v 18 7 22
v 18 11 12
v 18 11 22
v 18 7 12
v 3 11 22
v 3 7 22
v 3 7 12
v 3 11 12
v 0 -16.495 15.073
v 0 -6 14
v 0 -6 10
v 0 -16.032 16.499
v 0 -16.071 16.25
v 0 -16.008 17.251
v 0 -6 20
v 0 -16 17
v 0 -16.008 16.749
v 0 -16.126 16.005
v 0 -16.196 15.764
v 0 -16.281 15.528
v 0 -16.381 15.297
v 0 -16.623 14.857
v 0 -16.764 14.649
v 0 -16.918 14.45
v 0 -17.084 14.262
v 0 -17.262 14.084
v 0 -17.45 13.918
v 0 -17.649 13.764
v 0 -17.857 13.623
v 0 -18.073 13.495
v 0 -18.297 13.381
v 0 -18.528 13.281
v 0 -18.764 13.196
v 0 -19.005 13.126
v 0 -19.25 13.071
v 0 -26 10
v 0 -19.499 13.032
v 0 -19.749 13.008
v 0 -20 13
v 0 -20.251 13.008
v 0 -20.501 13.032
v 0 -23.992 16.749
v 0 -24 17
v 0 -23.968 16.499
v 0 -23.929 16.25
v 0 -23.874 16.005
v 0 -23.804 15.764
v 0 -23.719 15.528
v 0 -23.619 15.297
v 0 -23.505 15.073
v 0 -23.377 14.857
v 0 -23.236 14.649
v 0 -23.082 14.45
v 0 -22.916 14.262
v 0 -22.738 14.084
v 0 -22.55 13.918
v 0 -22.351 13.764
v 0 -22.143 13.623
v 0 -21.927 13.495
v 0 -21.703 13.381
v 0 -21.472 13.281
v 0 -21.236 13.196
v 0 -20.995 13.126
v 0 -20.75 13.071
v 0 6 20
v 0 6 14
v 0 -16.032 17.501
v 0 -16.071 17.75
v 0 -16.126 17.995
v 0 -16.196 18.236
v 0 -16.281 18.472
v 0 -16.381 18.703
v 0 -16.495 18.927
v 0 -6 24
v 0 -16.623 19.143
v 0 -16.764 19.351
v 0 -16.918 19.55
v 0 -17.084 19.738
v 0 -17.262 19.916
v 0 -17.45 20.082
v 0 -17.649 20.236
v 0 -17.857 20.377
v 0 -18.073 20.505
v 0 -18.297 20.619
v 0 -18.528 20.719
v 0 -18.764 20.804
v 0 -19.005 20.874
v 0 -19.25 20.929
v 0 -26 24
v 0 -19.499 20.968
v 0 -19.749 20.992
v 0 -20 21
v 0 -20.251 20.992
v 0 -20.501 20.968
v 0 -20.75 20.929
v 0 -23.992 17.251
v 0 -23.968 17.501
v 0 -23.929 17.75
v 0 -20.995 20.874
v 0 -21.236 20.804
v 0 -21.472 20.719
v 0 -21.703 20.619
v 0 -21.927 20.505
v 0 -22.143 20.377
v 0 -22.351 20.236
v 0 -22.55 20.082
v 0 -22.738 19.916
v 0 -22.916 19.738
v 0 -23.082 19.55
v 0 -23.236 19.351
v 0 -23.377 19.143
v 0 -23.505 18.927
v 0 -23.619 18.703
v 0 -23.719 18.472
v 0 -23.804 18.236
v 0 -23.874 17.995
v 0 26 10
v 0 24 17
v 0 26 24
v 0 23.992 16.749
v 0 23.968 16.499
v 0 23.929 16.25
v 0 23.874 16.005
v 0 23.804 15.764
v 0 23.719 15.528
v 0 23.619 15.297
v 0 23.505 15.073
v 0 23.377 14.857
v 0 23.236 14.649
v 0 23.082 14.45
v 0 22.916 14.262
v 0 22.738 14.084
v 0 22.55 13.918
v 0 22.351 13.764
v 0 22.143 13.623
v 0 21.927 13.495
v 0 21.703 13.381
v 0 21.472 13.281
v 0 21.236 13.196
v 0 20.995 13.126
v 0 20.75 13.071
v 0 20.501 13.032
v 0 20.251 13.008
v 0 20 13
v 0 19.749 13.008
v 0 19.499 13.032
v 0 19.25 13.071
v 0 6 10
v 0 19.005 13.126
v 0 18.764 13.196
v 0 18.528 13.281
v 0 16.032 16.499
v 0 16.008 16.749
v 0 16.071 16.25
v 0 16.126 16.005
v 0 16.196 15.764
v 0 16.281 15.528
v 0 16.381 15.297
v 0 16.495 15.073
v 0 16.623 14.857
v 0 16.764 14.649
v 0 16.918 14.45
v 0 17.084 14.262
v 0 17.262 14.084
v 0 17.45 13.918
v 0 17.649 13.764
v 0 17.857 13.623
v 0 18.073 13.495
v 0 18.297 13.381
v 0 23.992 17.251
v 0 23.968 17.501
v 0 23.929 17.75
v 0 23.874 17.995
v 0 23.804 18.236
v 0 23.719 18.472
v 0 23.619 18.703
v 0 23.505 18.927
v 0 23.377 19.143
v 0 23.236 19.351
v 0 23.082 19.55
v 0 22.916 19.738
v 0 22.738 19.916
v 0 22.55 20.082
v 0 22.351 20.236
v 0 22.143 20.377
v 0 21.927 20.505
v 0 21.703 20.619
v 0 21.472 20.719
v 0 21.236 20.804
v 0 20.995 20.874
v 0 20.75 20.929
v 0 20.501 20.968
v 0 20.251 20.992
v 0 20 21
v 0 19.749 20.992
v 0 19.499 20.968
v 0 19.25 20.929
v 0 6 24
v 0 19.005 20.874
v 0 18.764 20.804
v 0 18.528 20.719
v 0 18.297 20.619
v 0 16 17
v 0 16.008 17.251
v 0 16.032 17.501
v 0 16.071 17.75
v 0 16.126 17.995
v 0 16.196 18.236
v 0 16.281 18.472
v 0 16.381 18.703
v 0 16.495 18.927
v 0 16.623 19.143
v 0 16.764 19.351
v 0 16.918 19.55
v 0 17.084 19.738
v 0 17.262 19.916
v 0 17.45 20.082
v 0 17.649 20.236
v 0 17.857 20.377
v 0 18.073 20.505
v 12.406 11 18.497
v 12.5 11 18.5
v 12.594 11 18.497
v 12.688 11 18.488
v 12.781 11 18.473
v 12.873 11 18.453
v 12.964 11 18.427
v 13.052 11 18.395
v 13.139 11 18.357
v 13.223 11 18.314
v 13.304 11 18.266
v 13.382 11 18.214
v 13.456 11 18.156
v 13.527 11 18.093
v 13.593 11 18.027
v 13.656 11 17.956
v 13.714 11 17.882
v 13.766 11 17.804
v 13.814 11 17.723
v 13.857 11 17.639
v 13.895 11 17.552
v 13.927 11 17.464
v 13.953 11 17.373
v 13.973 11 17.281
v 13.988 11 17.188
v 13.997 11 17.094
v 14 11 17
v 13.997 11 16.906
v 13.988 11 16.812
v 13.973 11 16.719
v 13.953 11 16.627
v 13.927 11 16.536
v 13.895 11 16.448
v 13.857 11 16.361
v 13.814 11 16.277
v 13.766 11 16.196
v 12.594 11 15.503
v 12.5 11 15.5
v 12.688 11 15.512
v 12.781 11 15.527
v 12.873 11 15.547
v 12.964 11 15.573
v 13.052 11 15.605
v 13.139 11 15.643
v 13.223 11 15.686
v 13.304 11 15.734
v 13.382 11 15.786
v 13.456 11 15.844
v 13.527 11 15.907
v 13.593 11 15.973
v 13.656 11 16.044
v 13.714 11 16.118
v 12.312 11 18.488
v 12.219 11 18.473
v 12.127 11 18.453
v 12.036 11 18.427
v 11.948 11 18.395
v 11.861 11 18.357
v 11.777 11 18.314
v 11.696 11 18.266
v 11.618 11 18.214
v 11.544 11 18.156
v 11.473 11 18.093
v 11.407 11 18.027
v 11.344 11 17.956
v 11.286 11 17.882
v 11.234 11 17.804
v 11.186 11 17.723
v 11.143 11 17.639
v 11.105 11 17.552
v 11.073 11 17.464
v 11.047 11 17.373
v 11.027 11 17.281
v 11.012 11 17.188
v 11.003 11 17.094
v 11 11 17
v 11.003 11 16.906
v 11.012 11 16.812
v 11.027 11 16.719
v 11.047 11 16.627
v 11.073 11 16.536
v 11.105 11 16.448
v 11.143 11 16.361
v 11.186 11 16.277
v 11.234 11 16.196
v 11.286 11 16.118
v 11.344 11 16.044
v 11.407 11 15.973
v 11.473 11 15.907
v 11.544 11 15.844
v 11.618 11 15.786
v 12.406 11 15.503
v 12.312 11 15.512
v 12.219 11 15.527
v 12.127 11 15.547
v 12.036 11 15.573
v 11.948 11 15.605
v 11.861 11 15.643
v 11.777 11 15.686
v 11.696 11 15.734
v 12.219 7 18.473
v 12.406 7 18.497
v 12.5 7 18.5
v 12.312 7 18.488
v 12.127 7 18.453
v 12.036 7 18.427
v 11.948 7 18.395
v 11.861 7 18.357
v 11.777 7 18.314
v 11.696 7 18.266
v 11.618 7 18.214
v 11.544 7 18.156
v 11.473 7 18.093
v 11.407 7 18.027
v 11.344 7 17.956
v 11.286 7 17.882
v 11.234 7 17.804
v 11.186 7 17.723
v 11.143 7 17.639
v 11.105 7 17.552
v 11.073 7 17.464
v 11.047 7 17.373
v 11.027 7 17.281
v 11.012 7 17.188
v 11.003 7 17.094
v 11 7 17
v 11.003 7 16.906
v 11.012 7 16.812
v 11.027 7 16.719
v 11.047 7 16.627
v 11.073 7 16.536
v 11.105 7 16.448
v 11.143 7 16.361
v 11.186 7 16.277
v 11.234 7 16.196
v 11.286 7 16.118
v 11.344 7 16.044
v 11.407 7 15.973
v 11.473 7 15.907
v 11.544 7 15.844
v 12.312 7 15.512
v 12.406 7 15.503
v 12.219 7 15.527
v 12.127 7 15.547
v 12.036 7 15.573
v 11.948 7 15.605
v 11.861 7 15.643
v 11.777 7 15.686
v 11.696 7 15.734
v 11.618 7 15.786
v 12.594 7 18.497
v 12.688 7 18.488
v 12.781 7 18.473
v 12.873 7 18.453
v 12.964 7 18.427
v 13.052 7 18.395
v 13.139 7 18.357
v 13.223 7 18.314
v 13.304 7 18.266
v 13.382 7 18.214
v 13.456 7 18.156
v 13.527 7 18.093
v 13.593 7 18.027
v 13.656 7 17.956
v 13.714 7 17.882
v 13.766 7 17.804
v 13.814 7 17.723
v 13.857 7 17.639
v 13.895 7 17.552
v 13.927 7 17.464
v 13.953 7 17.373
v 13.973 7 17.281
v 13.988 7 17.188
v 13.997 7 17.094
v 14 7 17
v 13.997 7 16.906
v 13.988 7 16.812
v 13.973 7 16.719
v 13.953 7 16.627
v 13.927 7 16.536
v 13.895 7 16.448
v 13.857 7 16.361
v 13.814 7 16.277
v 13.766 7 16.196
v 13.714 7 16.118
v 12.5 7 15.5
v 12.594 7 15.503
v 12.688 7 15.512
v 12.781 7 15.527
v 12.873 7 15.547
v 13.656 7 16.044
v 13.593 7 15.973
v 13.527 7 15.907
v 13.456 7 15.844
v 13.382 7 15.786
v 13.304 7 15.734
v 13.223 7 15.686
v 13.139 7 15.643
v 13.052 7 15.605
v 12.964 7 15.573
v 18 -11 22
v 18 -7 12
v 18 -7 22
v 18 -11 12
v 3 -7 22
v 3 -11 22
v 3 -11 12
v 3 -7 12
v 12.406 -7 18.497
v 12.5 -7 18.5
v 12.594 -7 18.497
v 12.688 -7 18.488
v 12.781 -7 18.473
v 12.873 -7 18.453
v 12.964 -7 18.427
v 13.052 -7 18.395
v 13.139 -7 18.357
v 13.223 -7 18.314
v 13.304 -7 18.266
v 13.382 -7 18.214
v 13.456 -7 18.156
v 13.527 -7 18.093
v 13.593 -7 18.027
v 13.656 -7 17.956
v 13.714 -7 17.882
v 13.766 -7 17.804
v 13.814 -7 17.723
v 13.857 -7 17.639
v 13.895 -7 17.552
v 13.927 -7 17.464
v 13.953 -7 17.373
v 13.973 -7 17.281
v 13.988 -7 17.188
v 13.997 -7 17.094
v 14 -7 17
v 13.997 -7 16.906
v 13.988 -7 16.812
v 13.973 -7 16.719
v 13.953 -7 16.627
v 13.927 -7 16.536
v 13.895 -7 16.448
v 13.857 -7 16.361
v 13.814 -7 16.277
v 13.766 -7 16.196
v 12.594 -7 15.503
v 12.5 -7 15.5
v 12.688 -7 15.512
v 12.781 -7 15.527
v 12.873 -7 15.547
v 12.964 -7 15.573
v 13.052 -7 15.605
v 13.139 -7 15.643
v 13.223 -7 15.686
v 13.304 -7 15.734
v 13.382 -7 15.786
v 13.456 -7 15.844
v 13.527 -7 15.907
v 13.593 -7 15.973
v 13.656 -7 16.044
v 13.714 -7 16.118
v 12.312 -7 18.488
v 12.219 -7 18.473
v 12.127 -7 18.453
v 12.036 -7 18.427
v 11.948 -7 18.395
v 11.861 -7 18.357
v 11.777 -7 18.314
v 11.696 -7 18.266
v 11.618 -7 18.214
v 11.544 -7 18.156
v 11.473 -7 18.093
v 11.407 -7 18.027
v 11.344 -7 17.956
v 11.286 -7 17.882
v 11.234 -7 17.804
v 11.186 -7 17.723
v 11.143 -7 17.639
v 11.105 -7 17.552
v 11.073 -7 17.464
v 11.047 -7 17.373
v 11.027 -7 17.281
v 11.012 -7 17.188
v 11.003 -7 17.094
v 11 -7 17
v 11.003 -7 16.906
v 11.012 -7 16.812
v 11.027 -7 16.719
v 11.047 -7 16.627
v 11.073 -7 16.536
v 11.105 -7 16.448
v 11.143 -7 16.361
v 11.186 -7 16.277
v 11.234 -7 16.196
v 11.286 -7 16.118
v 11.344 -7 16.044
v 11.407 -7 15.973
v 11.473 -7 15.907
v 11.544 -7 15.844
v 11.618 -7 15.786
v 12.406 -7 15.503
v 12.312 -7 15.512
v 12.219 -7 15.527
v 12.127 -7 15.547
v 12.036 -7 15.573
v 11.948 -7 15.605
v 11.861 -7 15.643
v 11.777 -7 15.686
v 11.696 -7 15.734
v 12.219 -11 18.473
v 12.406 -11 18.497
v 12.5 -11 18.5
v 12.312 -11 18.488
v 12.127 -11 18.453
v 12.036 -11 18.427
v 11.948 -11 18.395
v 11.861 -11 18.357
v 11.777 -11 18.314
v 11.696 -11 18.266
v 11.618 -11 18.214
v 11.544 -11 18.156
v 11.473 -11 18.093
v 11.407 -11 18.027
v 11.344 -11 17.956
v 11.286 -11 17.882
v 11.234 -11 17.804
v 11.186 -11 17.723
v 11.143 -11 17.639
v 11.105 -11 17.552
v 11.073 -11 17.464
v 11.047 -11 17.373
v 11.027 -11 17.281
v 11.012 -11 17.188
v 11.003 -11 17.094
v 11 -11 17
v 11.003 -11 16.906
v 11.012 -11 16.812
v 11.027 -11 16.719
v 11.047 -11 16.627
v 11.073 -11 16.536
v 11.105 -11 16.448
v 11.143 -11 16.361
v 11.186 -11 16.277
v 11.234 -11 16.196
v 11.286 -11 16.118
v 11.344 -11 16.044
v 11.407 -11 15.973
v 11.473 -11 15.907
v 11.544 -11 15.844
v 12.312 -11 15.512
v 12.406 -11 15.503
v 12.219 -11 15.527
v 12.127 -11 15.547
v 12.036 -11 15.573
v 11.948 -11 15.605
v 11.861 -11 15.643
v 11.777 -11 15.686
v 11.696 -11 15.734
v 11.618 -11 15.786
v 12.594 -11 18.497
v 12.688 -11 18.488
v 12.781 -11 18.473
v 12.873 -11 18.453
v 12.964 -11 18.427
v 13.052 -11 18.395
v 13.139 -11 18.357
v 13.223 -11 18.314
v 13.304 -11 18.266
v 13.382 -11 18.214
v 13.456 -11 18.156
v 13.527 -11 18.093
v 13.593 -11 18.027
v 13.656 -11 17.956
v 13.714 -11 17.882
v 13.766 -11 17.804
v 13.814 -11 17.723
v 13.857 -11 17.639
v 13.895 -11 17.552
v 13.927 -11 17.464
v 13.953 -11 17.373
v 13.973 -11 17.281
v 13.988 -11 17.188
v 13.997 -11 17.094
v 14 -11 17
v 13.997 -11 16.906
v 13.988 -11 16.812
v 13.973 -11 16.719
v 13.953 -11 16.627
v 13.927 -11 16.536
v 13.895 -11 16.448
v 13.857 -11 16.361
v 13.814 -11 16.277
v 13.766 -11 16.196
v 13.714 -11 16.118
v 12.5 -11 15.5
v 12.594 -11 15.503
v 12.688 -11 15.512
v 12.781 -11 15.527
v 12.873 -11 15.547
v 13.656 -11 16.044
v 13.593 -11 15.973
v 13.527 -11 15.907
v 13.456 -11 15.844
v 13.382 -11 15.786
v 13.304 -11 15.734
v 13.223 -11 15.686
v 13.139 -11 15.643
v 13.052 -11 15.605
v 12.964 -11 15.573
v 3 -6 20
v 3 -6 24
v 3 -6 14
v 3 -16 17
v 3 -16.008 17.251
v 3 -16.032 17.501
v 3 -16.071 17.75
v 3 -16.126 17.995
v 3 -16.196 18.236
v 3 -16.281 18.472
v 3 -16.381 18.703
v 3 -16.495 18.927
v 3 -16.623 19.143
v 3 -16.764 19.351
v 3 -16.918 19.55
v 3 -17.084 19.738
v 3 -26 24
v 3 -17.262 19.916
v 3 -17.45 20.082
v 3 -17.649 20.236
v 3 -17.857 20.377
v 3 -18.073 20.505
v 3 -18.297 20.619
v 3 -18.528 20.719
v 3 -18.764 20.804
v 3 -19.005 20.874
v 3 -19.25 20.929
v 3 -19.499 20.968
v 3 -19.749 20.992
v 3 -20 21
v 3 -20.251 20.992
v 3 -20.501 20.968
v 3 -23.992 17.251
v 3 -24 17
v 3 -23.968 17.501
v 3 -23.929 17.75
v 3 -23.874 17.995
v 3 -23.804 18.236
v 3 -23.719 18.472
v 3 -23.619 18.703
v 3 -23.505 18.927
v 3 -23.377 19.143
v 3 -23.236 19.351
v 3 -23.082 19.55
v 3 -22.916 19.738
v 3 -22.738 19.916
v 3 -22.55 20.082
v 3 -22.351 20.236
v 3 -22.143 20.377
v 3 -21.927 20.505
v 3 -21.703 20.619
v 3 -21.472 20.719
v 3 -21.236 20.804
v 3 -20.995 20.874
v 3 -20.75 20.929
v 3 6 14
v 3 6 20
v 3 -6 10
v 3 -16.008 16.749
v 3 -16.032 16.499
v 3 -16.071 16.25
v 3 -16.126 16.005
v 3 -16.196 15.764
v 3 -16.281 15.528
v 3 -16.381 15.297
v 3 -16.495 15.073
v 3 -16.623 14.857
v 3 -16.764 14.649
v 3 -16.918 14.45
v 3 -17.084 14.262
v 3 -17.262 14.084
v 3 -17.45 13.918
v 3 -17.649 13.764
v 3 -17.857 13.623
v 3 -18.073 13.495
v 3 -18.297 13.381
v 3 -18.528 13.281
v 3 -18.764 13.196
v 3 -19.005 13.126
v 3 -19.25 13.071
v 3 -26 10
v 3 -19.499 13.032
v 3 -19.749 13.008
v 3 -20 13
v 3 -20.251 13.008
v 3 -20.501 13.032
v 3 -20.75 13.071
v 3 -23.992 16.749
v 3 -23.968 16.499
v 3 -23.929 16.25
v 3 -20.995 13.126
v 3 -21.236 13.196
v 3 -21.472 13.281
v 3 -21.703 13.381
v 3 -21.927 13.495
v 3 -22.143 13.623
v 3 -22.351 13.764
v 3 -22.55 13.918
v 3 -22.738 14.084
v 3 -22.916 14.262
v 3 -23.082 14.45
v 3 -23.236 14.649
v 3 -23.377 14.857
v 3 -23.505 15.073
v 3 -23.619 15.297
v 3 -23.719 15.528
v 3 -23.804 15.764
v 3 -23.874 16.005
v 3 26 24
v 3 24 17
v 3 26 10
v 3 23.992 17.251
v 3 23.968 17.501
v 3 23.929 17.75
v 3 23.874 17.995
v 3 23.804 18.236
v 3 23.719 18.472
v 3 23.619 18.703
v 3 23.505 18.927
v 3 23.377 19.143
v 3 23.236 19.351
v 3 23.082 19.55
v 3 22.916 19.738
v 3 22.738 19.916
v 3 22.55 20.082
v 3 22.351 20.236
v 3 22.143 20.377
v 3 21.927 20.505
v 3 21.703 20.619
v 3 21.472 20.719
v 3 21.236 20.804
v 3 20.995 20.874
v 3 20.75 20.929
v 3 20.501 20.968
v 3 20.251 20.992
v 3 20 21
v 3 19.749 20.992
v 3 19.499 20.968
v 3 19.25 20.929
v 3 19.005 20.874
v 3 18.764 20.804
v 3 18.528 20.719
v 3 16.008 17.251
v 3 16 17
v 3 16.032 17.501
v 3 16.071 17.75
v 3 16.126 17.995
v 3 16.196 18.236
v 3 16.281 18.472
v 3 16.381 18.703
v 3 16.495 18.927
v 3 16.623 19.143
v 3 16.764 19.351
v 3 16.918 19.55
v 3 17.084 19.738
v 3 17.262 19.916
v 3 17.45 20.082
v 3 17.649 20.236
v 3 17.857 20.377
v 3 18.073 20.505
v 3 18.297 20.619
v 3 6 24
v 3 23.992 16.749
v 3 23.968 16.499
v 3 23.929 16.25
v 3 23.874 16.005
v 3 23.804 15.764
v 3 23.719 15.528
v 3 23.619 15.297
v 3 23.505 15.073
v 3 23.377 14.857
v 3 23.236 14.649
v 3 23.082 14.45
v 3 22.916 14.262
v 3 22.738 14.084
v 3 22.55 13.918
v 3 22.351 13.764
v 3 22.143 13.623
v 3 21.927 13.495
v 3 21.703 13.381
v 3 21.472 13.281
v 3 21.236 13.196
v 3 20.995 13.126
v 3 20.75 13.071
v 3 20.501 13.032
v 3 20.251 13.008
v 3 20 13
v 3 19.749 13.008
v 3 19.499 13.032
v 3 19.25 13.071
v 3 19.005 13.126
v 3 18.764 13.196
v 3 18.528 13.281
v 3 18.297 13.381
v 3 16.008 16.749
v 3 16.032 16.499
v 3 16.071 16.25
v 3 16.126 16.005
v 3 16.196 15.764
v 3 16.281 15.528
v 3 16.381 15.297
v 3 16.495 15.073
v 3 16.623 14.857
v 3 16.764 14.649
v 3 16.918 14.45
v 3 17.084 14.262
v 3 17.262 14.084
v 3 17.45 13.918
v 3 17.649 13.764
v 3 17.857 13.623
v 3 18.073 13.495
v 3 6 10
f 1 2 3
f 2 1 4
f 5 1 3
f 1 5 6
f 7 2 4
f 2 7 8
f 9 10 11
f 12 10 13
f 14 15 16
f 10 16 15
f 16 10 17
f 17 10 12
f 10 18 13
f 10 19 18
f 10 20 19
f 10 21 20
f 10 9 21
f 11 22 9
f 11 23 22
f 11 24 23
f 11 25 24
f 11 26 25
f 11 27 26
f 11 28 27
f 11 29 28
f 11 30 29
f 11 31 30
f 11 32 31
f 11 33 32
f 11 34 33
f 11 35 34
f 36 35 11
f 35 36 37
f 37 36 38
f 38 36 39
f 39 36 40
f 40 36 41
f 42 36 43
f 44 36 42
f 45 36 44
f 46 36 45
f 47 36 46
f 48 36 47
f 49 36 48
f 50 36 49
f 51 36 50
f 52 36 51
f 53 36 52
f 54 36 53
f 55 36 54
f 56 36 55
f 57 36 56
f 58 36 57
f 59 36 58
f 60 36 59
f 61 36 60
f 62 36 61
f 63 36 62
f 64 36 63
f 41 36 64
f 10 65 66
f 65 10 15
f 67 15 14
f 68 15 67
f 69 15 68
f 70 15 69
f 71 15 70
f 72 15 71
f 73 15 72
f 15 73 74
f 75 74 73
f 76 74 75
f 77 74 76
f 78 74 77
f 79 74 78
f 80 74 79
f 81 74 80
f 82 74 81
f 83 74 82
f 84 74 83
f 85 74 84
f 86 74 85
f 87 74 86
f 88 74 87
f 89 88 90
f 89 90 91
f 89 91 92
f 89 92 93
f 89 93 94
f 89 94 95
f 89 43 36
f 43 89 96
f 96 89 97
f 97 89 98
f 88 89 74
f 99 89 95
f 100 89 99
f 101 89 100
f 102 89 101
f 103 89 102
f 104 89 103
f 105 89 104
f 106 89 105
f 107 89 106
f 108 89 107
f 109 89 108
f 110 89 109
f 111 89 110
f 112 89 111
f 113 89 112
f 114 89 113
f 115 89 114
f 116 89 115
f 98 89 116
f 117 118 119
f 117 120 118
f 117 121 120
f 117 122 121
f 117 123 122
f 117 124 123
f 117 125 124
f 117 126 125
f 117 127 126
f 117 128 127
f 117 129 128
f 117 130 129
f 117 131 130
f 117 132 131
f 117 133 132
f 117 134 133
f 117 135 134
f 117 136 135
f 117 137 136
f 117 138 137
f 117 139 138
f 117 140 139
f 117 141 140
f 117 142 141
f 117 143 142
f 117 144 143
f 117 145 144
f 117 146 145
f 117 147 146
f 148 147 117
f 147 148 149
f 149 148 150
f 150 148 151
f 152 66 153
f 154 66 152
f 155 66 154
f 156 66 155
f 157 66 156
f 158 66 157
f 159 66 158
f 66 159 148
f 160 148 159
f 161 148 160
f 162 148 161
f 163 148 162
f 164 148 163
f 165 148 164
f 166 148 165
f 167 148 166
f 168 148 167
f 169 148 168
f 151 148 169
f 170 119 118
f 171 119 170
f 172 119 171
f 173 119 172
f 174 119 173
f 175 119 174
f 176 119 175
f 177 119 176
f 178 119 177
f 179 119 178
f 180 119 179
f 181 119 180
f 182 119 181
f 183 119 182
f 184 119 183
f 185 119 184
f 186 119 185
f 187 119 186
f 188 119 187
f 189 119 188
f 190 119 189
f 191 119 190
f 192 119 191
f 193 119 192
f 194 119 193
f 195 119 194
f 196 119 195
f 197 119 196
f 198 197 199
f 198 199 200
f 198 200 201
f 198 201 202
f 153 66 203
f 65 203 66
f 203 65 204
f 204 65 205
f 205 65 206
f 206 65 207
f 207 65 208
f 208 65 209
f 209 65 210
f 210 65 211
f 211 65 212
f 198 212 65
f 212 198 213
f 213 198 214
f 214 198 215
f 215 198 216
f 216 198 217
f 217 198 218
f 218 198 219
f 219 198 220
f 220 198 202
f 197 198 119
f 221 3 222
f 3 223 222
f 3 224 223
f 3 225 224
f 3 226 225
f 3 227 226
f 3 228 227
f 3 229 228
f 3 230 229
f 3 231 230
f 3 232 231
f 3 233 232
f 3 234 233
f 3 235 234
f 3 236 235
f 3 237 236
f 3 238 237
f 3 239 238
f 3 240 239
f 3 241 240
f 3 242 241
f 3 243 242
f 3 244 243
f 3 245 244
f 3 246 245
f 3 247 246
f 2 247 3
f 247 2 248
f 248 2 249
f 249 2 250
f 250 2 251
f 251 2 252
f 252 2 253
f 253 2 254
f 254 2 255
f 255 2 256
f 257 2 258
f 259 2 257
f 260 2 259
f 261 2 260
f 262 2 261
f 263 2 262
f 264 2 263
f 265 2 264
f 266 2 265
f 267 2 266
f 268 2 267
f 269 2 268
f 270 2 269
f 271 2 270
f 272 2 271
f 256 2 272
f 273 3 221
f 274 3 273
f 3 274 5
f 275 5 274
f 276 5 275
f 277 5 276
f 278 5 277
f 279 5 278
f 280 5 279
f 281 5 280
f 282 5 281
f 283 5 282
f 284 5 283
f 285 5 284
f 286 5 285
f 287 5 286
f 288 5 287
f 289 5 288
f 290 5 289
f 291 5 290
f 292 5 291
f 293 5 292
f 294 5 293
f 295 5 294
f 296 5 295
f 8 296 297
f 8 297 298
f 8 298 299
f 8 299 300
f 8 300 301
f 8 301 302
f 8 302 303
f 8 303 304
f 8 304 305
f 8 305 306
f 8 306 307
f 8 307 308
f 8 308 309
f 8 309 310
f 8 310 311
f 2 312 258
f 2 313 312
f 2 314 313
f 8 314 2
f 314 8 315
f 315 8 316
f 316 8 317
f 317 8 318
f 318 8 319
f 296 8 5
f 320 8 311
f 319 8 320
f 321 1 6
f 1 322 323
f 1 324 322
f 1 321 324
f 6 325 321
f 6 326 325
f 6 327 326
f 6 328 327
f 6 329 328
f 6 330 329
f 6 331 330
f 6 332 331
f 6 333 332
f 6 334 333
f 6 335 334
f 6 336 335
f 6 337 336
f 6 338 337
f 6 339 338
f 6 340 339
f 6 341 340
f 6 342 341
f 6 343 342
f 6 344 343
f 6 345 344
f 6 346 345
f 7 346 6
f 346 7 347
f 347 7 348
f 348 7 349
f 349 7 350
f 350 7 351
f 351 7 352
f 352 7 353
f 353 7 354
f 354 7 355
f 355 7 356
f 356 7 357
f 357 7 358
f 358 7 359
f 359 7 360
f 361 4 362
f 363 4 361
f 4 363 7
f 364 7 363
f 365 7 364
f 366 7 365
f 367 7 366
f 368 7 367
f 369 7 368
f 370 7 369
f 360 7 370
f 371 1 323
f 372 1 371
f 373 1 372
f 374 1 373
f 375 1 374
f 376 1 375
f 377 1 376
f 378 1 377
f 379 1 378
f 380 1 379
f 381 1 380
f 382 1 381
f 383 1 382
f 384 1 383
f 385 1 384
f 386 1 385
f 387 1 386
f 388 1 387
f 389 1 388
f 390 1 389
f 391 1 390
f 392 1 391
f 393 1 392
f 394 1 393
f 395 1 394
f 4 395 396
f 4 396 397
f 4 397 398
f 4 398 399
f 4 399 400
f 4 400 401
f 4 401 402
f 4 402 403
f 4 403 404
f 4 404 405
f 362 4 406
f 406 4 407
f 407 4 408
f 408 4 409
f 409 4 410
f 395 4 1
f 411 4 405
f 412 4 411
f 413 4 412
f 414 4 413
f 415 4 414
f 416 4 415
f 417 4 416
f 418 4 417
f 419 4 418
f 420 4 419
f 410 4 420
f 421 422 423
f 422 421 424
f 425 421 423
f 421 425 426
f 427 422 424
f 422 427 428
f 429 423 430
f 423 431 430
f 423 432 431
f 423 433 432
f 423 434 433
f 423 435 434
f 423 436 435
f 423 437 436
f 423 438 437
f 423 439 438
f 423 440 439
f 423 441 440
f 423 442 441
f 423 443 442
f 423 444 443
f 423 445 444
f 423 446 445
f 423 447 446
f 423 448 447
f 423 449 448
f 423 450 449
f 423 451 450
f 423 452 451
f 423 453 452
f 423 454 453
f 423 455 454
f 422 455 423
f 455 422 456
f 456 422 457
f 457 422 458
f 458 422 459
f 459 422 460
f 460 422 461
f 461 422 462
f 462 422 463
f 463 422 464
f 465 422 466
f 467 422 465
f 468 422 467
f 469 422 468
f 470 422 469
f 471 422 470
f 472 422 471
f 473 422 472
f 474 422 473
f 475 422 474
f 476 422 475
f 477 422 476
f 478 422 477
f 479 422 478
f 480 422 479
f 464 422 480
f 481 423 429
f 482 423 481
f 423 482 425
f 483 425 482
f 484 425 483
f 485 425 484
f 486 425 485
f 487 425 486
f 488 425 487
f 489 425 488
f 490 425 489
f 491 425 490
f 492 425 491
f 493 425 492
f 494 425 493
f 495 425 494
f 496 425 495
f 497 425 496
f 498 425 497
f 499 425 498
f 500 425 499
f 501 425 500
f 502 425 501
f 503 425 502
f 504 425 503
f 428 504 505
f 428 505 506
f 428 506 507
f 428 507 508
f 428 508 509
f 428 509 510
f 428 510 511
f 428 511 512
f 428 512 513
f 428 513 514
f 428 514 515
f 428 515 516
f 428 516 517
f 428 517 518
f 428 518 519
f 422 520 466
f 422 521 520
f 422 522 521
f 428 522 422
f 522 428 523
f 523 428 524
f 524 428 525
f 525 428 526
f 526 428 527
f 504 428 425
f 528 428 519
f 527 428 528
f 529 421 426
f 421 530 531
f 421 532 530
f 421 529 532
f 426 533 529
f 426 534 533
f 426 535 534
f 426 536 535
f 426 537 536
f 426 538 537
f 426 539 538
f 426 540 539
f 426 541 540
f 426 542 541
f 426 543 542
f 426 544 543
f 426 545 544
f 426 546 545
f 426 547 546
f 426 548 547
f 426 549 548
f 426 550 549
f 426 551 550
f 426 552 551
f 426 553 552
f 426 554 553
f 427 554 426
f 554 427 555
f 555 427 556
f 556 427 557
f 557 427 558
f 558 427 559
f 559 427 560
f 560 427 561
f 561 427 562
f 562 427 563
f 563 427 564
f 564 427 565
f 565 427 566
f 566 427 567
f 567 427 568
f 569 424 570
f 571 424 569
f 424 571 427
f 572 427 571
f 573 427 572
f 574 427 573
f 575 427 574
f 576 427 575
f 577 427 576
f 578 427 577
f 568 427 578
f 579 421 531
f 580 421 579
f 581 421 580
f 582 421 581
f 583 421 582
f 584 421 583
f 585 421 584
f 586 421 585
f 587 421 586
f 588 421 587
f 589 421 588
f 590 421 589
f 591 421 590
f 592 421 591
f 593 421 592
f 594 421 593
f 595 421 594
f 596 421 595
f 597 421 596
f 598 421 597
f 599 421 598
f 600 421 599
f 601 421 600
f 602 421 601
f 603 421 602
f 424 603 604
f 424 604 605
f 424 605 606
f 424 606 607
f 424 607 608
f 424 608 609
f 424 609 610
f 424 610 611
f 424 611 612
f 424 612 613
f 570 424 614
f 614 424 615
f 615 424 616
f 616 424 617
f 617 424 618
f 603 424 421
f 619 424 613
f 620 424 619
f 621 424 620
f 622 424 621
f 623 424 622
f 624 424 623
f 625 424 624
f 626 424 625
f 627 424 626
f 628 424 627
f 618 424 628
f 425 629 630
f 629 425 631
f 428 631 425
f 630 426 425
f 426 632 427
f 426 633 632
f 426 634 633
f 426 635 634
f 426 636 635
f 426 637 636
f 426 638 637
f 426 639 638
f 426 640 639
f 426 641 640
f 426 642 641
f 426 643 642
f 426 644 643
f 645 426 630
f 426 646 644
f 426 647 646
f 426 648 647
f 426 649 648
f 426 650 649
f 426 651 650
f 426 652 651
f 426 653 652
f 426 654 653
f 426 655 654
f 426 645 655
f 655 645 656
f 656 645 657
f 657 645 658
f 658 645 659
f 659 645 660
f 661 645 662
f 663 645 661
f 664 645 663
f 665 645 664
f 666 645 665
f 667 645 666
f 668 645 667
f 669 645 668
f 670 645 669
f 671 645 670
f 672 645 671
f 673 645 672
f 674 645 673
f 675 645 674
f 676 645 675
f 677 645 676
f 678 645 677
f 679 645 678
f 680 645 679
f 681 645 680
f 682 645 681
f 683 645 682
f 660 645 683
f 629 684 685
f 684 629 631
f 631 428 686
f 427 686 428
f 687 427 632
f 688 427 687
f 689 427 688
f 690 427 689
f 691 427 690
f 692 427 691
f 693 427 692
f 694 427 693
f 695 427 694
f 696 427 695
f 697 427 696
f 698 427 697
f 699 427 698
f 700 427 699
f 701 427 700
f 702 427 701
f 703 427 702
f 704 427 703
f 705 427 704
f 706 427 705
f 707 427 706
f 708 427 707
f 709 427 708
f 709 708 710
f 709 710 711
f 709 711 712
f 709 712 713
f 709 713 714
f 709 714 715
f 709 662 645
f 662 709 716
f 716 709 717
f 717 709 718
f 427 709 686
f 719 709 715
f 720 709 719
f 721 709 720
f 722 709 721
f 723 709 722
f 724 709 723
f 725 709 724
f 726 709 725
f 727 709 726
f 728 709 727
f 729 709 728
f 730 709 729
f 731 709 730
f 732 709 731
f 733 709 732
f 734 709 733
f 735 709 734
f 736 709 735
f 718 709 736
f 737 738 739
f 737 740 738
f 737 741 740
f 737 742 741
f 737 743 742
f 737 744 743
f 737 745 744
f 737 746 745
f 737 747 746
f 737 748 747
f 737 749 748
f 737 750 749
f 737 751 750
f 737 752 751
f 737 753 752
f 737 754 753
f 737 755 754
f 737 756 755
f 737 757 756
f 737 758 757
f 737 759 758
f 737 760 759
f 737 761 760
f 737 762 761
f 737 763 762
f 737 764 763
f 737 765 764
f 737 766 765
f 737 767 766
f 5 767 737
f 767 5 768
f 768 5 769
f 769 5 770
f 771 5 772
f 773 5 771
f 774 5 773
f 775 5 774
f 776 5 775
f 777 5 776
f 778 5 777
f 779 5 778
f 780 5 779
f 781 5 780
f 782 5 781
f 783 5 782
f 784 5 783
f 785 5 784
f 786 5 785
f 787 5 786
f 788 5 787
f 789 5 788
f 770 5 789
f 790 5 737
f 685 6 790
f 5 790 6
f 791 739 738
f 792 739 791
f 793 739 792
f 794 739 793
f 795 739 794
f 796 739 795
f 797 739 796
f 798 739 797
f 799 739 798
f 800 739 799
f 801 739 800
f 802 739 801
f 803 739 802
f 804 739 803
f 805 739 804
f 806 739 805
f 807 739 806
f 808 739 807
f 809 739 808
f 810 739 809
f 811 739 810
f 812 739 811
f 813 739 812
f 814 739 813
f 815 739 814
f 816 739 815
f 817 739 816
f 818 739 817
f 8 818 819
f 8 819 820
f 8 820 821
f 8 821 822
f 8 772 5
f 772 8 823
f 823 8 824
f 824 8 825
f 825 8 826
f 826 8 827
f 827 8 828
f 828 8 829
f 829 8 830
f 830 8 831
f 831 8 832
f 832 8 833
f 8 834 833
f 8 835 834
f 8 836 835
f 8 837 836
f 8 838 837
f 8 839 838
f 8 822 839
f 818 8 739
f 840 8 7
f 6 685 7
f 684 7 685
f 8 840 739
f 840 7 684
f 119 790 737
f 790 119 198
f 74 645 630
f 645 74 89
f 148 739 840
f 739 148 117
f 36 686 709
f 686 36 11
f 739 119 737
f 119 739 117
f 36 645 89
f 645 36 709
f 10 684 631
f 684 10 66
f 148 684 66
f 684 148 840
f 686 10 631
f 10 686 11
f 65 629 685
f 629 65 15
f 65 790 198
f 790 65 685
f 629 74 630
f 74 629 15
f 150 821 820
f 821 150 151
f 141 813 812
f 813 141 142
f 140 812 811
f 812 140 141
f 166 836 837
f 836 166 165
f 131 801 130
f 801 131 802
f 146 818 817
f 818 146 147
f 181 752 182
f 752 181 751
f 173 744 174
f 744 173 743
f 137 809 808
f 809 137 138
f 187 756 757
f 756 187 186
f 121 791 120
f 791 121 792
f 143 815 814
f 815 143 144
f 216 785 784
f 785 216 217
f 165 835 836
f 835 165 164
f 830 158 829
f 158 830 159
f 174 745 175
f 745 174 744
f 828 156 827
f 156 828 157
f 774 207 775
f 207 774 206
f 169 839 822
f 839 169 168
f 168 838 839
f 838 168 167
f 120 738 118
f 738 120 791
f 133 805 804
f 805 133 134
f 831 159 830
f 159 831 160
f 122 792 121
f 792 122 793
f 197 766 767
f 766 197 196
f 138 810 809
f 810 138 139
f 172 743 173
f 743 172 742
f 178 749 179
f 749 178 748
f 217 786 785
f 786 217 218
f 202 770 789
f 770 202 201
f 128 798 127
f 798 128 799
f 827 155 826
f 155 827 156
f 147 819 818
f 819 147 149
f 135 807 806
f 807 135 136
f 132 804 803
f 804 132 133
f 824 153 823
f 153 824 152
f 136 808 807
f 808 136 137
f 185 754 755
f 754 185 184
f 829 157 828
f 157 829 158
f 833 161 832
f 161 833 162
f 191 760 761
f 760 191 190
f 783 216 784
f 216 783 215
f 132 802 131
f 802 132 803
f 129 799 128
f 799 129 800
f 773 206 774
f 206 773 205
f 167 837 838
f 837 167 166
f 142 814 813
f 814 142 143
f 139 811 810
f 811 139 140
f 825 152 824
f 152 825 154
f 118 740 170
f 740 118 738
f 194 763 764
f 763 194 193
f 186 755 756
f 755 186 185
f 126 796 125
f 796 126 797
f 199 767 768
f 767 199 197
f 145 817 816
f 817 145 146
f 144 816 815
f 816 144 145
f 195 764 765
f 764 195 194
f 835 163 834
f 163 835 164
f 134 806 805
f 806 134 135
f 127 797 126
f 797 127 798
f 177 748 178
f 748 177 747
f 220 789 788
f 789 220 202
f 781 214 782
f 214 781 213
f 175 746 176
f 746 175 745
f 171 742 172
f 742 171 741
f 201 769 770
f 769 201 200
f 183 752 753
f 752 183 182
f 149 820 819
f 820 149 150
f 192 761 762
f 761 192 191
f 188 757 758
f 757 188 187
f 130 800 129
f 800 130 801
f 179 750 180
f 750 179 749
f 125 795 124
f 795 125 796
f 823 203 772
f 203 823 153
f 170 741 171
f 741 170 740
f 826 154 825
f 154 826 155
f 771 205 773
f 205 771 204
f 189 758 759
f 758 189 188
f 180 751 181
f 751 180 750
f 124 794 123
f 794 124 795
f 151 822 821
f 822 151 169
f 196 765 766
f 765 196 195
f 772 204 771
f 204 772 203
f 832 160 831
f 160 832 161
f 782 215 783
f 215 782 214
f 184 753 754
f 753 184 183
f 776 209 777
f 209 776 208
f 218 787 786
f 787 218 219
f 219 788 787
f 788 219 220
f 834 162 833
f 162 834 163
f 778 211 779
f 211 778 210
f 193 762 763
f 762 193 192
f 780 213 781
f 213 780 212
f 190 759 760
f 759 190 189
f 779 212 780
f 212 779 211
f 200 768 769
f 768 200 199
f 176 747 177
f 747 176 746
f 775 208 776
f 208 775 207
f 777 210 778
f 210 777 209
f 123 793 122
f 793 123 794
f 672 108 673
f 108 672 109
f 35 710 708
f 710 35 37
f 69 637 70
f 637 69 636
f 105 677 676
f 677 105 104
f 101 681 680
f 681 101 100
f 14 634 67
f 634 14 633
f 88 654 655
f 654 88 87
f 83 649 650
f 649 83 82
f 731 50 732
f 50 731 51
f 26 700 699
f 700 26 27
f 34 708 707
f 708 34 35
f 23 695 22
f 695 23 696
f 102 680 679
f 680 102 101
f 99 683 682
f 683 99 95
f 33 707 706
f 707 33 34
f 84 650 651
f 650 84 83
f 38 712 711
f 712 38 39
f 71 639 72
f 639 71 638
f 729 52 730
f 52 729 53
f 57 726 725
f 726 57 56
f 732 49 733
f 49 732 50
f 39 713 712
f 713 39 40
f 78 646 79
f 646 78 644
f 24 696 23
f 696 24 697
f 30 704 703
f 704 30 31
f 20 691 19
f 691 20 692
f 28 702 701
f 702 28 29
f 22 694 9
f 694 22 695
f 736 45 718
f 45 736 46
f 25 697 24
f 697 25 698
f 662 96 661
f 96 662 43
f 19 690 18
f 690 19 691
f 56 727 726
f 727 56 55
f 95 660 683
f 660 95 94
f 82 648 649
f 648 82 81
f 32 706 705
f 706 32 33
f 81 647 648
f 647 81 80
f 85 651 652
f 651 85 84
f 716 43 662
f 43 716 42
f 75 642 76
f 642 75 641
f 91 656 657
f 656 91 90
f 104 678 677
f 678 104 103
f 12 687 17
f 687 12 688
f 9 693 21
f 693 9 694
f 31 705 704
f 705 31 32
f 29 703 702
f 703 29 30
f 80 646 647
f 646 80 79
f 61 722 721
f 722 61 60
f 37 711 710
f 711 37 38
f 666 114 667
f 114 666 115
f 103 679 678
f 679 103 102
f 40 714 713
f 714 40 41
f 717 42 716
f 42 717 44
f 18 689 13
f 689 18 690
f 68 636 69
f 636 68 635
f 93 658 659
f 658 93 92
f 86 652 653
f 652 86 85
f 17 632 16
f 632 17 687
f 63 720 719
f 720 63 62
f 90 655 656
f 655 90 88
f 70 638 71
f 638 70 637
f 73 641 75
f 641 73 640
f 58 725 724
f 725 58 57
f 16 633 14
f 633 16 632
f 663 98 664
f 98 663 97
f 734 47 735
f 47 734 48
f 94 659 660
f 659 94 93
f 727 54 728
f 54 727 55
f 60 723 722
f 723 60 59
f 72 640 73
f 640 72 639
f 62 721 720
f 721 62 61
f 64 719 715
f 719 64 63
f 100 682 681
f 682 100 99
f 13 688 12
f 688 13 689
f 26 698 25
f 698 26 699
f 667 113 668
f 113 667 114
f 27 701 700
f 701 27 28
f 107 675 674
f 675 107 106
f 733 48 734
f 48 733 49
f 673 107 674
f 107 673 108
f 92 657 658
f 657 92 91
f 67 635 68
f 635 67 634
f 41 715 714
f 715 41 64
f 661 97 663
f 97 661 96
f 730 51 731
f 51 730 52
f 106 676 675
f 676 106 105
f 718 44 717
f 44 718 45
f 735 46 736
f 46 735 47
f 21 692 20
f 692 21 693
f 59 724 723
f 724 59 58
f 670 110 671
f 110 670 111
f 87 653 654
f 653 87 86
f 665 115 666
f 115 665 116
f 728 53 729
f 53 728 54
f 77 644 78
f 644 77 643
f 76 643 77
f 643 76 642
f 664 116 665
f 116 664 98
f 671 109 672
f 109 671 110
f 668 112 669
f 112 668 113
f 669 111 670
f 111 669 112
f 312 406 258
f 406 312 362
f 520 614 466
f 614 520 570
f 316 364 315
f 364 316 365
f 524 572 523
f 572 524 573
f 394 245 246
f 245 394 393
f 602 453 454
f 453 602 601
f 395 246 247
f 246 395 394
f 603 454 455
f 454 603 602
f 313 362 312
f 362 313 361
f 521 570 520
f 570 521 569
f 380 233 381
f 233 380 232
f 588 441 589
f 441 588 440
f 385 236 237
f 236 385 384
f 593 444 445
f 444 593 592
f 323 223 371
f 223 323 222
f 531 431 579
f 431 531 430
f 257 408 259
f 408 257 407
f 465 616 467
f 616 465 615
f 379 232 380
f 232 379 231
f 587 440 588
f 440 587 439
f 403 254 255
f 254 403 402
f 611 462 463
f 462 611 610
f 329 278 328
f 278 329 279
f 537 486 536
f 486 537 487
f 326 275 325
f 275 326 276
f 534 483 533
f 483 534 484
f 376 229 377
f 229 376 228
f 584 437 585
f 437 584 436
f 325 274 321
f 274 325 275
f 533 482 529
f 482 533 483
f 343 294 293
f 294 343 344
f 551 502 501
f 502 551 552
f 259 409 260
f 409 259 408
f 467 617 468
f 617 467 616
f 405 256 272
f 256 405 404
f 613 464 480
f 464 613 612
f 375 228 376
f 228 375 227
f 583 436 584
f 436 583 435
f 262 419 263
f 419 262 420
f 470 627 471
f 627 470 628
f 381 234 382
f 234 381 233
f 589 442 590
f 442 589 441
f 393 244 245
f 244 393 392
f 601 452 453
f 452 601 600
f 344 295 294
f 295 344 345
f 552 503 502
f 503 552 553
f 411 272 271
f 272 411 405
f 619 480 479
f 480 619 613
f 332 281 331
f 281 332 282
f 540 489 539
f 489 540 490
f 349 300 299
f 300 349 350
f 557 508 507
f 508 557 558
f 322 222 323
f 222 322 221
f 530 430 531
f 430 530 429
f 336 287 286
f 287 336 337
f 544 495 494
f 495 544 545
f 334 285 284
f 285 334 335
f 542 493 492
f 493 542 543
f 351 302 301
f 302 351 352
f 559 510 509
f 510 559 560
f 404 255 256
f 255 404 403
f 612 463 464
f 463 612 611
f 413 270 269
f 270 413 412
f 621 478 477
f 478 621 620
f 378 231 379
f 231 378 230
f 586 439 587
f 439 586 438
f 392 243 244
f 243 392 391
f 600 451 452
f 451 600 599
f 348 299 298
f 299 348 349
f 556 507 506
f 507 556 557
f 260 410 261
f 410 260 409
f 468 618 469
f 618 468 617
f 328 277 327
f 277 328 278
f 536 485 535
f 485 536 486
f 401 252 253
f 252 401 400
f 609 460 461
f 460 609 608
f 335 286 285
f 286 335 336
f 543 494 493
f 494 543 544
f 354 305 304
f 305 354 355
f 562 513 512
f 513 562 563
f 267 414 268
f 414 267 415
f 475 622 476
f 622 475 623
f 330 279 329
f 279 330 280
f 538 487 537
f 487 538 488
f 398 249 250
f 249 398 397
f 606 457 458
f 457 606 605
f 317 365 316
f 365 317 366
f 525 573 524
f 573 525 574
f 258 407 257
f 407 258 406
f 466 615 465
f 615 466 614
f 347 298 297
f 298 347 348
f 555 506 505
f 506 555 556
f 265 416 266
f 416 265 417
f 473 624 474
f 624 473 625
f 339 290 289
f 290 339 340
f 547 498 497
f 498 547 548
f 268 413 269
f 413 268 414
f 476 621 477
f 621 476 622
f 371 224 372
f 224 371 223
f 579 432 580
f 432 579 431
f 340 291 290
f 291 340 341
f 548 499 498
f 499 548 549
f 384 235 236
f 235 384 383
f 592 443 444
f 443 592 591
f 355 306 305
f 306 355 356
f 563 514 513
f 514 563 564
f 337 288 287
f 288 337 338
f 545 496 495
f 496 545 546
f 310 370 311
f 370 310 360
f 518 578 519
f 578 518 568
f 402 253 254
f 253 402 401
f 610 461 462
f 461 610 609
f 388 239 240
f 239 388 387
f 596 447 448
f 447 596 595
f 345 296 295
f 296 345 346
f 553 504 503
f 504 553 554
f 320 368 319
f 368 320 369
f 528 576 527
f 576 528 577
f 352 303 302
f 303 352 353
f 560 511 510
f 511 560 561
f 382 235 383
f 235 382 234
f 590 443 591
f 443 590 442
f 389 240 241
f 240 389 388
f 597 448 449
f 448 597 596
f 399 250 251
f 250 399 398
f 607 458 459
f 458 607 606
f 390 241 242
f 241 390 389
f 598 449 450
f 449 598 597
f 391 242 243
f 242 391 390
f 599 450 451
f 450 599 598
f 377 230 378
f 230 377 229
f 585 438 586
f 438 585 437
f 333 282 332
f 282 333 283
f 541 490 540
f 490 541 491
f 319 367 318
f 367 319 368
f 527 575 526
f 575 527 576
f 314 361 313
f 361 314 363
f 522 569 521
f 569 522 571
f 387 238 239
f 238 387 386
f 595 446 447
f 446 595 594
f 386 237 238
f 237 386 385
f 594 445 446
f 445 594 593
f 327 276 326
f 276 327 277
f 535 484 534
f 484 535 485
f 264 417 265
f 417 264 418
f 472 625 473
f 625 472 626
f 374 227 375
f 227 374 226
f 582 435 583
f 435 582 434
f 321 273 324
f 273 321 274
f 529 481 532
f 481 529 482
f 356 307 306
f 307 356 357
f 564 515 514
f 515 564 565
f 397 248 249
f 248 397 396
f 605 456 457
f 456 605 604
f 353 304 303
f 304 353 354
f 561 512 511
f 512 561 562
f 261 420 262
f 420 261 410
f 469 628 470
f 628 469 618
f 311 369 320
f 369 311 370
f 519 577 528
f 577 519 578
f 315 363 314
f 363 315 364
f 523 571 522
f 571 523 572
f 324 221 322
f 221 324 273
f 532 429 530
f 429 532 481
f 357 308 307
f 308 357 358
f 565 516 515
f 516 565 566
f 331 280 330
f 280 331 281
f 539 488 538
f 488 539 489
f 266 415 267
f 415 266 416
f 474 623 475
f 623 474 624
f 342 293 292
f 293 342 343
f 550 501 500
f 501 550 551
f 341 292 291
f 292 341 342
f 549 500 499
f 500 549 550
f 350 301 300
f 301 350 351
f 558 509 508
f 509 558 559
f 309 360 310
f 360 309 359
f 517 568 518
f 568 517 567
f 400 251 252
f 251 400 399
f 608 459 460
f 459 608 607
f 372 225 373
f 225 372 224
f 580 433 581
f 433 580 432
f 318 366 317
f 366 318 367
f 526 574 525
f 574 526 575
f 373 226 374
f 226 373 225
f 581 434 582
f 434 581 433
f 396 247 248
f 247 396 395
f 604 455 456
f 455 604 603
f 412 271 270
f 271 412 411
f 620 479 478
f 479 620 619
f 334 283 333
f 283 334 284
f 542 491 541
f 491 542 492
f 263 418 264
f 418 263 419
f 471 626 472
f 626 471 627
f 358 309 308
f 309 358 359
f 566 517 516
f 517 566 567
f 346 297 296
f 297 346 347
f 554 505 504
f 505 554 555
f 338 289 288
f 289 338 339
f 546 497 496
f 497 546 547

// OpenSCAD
difference(){
	union(){         
        translate([0,7,12]){
           cube([18,4,10], center=false);
        }
        translate([0,-11,12]){
           cube([18,4,10], center=false);
        }
        translate([0,-26,10]){
           cube([3,52,14], center=false);
        }

       
        
	}
	union() {

	    translate([-1,-6,4]){
           cube([10,12,10], center=false);
        }	
	    translate([-1,-6,20]){
           cube([10,12,10], center=false);
        }	
	
        translate([-10,20,17]){
            rotate(a = [0,90,0]) {
                cylinder(h=320, r=4, $fn=100, center=false);
            }
        }	
        translate([-10,-20,17]){
            rotate(a = [0,90,0]) {
                cylinder(h=320, r=4, $fn=100, center=false);
            }
        }	

	
       translate([12.5,20,17]){
            rotate(a = [90,0,0]) {
                cylinder(h=320, r=1.5, $fn=100, center=false);
            }
        }	


	}
}
